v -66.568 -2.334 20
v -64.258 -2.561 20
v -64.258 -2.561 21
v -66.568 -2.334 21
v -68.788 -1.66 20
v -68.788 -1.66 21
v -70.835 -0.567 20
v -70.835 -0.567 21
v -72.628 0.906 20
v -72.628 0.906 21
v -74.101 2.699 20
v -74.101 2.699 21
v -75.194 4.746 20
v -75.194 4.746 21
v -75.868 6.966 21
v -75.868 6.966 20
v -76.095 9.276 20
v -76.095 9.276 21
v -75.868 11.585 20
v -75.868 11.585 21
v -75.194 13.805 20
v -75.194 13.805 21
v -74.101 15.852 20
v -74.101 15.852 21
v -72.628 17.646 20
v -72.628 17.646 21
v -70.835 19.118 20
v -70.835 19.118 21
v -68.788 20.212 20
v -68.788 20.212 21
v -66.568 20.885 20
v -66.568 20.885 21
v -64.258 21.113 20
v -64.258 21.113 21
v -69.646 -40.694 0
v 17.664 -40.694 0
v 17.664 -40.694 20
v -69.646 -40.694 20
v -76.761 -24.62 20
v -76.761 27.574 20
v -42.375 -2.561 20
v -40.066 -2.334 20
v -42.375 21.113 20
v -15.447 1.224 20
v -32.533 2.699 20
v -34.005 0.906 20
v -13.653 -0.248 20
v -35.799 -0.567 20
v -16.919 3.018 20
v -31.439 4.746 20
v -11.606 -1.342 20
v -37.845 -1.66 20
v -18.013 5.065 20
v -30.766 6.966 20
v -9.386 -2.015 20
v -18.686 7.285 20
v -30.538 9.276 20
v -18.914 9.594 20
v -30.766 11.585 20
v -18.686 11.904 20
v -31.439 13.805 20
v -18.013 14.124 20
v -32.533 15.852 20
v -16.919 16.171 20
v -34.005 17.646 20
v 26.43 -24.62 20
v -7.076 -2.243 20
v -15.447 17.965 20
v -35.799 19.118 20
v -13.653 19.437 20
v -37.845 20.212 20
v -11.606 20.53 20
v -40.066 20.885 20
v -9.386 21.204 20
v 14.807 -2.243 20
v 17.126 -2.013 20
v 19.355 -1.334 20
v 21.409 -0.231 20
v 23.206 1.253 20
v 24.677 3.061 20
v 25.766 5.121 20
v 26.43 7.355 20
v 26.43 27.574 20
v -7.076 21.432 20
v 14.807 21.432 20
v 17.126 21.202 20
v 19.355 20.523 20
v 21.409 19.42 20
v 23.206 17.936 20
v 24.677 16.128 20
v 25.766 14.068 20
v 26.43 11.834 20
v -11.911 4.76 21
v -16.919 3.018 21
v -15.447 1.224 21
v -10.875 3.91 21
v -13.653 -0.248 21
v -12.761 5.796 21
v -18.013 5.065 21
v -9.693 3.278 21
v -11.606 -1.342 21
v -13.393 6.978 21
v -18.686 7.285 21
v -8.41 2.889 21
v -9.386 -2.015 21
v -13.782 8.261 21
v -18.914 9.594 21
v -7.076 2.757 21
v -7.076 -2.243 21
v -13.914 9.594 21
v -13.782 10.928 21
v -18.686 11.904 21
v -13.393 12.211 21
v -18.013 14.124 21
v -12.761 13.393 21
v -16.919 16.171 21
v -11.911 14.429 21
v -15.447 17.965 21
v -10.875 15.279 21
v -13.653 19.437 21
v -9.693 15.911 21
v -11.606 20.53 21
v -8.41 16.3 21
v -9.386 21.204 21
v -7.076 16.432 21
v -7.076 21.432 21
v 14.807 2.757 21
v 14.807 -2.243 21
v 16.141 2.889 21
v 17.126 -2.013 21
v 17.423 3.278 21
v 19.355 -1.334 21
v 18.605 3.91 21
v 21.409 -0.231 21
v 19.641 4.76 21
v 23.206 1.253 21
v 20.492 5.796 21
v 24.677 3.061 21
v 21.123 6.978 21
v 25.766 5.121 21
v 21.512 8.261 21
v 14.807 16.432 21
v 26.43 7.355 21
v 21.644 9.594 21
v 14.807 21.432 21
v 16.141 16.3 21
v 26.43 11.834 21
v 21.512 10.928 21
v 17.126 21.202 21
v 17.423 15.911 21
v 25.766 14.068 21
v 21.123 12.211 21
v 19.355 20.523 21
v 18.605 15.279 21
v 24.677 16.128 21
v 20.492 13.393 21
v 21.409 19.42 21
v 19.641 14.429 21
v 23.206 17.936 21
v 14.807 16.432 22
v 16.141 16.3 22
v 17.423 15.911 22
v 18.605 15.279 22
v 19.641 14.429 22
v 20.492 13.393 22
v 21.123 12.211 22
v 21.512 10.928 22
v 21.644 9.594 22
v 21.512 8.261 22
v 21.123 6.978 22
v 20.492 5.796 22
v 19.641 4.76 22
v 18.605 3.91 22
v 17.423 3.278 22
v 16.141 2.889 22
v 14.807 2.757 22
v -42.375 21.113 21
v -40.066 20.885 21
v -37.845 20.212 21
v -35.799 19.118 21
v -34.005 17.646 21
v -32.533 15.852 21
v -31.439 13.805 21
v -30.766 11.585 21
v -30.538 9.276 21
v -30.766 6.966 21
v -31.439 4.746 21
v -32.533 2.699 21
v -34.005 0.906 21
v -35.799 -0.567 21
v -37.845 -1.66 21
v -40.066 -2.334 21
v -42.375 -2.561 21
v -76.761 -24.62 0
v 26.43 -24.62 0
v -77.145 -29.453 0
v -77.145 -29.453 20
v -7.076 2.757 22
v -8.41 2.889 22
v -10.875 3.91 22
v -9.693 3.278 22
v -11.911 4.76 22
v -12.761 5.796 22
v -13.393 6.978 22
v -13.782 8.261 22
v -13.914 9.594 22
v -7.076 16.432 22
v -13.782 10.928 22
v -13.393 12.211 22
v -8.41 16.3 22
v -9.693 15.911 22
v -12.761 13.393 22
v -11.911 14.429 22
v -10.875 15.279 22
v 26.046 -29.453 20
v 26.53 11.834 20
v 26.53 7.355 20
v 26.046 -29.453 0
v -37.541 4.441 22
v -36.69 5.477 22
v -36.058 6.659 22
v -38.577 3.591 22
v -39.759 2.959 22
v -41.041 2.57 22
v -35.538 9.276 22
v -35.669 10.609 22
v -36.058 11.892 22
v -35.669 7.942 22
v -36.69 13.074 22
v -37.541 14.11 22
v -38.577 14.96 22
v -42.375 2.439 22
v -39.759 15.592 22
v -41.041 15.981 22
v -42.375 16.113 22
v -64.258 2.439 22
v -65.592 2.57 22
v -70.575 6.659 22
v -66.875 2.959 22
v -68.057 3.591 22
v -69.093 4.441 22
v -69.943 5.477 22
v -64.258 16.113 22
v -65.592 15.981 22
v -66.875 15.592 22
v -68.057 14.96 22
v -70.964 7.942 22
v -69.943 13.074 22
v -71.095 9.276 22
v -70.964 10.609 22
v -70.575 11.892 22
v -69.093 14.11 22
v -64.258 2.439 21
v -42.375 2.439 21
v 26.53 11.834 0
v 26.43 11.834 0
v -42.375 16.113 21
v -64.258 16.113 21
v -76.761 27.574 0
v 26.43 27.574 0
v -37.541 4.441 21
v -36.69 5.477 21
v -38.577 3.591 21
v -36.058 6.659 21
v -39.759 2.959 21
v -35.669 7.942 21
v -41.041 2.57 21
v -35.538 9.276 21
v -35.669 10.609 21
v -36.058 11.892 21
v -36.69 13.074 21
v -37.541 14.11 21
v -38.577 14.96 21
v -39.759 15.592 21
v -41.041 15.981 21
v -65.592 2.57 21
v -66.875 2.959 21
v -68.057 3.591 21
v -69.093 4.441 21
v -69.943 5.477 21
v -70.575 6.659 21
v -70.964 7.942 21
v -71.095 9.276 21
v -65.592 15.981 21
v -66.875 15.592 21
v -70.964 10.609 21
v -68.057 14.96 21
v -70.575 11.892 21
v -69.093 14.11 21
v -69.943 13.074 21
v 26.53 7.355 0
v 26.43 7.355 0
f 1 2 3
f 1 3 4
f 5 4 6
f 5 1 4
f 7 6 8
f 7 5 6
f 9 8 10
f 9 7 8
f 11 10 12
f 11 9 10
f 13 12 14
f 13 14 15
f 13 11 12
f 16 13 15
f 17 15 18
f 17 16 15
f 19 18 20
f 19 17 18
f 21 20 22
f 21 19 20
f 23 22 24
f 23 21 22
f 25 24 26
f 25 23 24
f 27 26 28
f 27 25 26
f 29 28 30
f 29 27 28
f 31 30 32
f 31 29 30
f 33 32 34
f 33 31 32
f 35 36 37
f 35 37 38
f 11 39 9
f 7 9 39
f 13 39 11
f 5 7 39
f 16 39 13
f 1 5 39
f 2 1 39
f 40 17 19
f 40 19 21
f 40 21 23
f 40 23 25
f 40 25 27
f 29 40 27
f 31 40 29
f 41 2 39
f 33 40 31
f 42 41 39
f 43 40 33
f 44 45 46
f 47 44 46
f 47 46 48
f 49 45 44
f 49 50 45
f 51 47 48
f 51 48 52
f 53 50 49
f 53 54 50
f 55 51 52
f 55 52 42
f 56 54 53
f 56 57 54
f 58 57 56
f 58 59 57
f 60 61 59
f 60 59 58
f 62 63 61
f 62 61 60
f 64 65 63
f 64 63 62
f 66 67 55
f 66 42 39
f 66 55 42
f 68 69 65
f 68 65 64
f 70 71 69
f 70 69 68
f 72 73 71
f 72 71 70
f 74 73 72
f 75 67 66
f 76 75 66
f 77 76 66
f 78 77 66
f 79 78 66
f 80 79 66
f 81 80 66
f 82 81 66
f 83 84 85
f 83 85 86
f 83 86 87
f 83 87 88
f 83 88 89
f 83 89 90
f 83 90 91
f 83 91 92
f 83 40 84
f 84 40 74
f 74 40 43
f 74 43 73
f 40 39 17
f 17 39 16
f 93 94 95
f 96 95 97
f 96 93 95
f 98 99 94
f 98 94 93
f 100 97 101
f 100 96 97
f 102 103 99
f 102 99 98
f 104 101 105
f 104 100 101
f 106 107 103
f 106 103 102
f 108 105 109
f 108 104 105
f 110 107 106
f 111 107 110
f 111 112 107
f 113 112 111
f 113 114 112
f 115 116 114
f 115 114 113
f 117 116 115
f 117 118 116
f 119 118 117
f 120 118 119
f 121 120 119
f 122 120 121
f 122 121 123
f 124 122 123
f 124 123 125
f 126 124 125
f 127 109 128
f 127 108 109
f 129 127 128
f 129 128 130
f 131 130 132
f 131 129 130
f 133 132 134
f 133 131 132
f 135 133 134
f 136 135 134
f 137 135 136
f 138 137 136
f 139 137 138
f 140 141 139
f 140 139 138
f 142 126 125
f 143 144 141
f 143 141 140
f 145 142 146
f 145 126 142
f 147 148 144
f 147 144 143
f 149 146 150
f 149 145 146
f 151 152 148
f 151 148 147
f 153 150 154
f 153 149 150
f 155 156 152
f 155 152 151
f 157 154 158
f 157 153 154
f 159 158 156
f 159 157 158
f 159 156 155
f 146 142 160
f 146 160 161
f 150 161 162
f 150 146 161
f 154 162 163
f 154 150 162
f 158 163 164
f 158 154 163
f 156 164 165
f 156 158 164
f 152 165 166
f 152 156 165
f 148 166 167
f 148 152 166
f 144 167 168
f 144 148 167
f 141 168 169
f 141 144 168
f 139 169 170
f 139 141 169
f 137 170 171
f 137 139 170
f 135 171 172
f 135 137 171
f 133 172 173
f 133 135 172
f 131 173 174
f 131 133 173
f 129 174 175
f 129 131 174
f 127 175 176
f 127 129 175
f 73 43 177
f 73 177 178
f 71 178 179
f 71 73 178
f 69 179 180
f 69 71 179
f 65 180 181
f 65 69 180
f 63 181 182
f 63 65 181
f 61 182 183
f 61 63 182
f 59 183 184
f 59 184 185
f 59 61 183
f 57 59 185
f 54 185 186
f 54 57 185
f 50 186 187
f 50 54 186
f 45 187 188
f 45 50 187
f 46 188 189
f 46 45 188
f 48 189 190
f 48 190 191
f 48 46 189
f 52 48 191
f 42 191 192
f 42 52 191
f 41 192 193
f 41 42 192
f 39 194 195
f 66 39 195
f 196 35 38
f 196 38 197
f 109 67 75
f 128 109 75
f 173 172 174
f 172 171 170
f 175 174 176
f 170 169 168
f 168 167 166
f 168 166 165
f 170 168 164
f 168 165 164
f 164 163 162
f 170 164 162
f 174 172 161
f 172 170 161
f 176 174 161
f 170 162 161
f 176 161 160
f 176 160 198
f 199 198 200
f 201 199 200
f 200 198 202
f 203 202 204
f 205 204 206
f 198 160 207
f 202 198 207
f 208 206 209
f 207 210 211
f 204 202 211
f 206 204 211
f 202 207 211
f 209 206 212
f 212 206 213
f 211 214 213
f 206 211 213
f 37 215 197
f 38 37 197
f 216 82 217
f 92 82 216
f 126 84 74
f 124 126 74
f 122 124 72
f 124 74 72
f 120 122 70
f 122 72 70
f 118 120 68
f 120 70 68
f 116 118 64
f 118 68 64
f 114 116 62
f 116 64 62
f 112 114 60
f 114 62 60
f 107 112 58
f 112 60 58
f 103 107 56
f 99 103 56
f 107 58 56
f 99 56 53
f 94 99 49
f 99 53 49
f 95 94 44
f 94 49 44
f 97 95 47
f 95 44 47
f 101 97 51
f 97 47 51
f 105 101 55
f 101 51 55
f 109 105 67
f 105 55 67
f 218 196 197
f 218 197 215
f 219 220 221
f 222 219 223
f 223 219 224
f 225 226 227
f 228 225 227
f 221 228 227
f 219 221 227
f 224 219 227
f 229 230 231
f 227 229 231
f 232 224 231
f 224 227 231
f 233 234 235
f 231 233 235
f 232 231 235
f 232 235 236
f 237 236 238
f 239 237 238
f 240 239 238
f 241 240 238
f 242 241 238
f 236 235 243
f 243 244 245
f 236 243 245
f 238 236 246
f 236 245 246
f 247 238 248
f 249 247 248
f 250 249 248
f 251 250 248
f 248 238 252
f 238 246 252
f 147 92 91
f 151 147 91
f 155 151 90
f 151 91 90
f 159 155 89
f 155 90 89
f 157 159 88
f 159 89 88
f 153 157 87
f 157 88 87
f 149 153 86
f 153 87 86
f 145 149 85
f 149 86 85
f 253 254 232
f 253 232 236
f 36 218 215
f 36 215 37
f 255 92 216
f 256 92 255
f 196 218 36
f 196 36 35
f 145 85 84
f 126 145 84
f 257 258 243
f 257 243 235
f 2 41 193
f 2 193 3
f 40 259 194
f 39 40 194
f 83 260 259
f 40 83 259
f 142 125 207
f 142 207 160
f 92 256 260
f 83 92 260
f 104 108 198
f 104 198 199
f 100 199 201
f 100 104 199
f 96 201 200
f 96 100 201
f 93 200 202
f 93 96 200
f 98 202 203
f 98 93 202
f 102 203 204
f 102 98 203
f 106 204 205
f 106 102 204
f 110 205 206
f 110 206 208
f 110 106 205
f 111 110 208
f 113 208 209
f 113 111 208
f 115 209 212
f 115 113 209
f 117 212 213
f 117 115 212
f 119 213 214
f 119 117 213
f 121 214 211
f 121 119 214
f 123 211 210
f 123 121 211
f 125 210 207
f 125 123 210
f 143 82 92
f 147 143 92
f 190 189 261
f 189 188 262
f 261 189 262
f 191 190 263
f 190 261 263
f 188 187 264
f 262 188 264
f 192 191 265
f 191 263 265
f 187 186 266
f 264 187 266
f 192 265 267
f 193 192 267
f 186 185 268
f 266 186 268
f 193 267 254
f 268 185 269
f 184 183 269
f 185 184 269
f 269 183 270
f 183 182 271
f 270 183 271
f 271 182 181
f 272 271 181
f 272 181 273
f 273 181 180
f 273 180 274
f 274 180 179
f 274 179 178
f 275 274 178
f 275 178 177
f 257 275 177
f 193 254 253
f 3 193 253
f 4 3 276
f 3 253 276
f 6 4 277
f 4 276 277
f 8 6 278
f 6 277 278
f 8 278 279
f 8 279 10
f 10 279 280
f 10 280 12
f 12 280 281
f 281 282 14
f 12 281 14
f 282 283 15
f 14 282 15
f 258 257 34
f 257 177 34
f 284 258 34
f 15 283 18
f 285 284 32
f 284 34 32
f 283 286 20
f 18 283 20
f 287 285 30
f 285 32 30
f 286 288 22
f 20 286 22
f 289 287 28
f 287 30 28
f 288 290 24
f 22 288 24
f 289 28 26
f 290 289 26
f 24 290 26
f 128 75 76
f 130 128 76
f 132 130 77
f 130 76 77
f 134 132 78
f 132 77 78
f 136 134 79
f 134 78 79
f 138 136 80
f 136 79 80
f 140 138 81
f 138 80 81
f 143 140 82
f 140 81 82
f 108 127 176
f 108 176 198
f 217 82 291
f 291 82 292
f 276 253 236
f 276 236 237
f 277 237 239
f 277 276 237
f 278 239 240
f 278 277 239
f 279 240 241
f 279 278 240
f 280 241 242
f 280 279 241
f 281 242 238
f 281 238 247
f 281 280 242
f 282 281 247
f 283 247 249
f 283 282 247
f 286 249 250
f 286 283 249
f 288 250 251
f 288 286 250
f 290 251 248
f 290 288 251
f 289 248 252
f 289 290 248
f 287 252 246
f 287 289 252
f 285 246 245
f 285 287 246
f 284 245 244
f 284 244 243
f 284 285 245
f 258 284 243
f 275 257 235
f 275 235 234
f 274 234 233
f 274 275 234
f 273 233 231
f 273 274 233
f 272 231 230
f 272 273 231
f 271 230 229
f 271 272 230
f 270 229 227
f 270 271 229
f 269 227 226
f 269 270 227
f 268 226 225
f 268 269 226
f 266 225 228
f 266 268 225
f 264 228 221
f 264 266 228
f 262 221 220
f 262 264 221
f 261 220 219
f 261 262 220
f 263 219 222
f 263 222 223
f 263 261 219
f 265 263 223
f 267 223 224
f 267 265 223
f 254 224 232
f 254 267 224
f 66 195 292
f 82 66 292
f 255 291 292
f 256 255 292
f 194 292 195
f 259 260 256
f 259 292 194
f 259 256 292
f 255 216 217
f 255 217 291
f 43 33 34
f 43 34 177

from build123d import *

# Parameters (mm, degrees)
BOSS_EXTRUDE2_DEPTH = 20
BOSS_EXTRUDE3_DEPTH = 20
SKETCH2_W           = 20
SKETCH2_H           = 4.478337627
BOSS_EXTRUDE4_DEPTH = 0.1
BOSS_EXTRUDE6_DEPTH = 21
BOSS_EXTRUDE7_DEPTH = 22


with BuildPart() as part:
    # Sketch1 → Boss-Extrude2 (new body)
    with BuildSketch(Plane.XY):
        with BuildLine():
            Line((26.430090028, 27.574352135), (-76.761417751, 27.574352135))
            Line((-76.761417751, 27.574352135), (-76.761417751, -24.620243368))
            Line((-76.761417751, -24.620243368), (26.430090028, -24.620243368))
            Line((26.430090028, -24.620243368), (26.430090028, 7.355287067))
            ThreePointArc((26.430090028, 7.355287067), (22.343684755, 0.466997357), (14.806753156, -2.242597682))
            Line((14.806753156, -2.242597682), (-7.076489516, -2.242597682))
            ThreePointArc((-7.076489516, -2.242597682), (-18.913543078, 9.594455881), (-7.076489516, 21.431509443))
            Line((-7.076489516, 21.431509443), (14.806753156, 21.431509443))
            ThreePointArc((14.806753156, 21.431509443), (22.343684755, 18.721914404), (26.430090028, 11.833624694))
            Line((26.430090028, 11.833624694), (26.430090028, 27.574352135))
        make_face()
        with BuildLine():
            ThreePointArc((-64.258353778, -2.561422734), (-76.095407341, 9.275630828), (-64.258353778, 21.11268439))
            Line((-64.258353778, 21.11268439), (-42.375111107, 21.11268439))
            ThreePointArc((-42.375111107, 21.11268439), (-30.538057545, 9.275630828), (-42.375111107, -2.561422734))
            Line((-42.375111107, -2.561422734), (-64.258353778, -2.561422734))
        make_face(mode=Mode.SUBTRACT)
    extrude(amount=BOSS_EXTRUDE2_DEPTH)



with BuildPart() as body_2:
    # Sketch1<6> → Boss-Extrude3 (new body)
    with BuildSketch(Plane.XY):
        Polygon((26.046102884, -29.45332066), (-77.145404895, -29.45332066), (-69.645687176, -40.69387077), (17.664278645, -40.69387077), align=None)
    extrude(amount=BOSS_EXTRUDE3_DEPTH)


with BuildPart() as body_3:
    # Sketch2 → Boss-Extrude4 (new body)
    with BuildSketch(Plane(origin=(26.430090028, 0, 0), x_dir=(0, 0, -1), z_dir=(1, 0, 0))):
        with Locations((-10, 9.59445588)):
            Rectangle(SKETCH2_W, SKETCH2_H)
    extrude(amount=BOSS_EXTRUDE4_DEPTH)


with BuildPart() as part_1:
    add(part.part)

    add(body_3.part)  # Boss-Extrude6 merges body 3
    # Sketch1<8> → Boss-Extrude6 (add)
    with BuildSketch(Plane.XY):
        with BuildLine():
            Line((26.430090028, 7.355287067), (26.430090028, 11.833624694))
            ThreePointArc((26.430090028, 11.833624694), (22.343684755, 18.721914404), (14.806753156, 21.431509443))
            Line((14.806753156, 21.431509443), (-7.076489516, 21.431509443))
            ThreePointArc((-7.076489516, 21.431509443), (-18.913543078, 9.594455881), (-7.076489516, -2.242597682))
            Line((-7.076489516, -2.242597682), (14.806753156, -2.242597682))
            ThreePointArc((14.806753156, -2.242597682), (22.343684755, 0.466997357), (26.430090028, 7.355287067))
        make_face()
        with BuildLine():
            Line((-42.375111107, 21.11268439), (-64.258353778, 21.11268439))
            ThreePointArc((-64.258353778, 21.11268439), (-76.095407341, 9.275630828), (-64.258353778, -2.561422734))
            Line((-64.258353778, -2.561422734), (-42.375111107, -2.561422734))
            ThreePointArc((-42.375111107, -2.561422734), (-30.538057545, 9.275630828), (-42.375111107, 21.11268439))
        make_face()
    extrude(amount=BOSS_EXTRUDE6_DEPTH)

    # Sketch1<9> → Boss-Extrude7 (add)
    with BuildSketch(Plane.XY):
        with BuildLine():
            Line((-64.258353778, 16.11268439), (-42.375111107, 16.11268439))
            ThreePointArc((-42.375111107, 16.11268439), (-35.538057545, 9.275630828), (-42.375111107, 2.438577266))
            Line((-42.375111107, 2.438577266), (-64.258353778, 2.438577266))
            ThreePointArc((-64.258353778, 2.438577266), (-71.095407341, 9.275630828), (-64.258353778, 16.11268439))
        make_face()
        with BuildLine():
            Line((-7.076489516, 16.431509443), (14.806753156, 16.431509443))
            ThreePointArc((14.806753156, 16.431509443), (21.643806718, 9.594455881), (14.806753156, 2.757402318))
            Line((14.806753156, 2.757402318), (-7.076489516, 2.757402318))
            ThreePointArc((-7.076489516, 2.757402318), (-13.913543078, 9.594455881), (-7.076489516, 16.431509443))
        make_face()
    extrude(amount=BOSS_EXTRUDE7_DEPTH)


solid = Compound([body_2.part, part_1.part])
